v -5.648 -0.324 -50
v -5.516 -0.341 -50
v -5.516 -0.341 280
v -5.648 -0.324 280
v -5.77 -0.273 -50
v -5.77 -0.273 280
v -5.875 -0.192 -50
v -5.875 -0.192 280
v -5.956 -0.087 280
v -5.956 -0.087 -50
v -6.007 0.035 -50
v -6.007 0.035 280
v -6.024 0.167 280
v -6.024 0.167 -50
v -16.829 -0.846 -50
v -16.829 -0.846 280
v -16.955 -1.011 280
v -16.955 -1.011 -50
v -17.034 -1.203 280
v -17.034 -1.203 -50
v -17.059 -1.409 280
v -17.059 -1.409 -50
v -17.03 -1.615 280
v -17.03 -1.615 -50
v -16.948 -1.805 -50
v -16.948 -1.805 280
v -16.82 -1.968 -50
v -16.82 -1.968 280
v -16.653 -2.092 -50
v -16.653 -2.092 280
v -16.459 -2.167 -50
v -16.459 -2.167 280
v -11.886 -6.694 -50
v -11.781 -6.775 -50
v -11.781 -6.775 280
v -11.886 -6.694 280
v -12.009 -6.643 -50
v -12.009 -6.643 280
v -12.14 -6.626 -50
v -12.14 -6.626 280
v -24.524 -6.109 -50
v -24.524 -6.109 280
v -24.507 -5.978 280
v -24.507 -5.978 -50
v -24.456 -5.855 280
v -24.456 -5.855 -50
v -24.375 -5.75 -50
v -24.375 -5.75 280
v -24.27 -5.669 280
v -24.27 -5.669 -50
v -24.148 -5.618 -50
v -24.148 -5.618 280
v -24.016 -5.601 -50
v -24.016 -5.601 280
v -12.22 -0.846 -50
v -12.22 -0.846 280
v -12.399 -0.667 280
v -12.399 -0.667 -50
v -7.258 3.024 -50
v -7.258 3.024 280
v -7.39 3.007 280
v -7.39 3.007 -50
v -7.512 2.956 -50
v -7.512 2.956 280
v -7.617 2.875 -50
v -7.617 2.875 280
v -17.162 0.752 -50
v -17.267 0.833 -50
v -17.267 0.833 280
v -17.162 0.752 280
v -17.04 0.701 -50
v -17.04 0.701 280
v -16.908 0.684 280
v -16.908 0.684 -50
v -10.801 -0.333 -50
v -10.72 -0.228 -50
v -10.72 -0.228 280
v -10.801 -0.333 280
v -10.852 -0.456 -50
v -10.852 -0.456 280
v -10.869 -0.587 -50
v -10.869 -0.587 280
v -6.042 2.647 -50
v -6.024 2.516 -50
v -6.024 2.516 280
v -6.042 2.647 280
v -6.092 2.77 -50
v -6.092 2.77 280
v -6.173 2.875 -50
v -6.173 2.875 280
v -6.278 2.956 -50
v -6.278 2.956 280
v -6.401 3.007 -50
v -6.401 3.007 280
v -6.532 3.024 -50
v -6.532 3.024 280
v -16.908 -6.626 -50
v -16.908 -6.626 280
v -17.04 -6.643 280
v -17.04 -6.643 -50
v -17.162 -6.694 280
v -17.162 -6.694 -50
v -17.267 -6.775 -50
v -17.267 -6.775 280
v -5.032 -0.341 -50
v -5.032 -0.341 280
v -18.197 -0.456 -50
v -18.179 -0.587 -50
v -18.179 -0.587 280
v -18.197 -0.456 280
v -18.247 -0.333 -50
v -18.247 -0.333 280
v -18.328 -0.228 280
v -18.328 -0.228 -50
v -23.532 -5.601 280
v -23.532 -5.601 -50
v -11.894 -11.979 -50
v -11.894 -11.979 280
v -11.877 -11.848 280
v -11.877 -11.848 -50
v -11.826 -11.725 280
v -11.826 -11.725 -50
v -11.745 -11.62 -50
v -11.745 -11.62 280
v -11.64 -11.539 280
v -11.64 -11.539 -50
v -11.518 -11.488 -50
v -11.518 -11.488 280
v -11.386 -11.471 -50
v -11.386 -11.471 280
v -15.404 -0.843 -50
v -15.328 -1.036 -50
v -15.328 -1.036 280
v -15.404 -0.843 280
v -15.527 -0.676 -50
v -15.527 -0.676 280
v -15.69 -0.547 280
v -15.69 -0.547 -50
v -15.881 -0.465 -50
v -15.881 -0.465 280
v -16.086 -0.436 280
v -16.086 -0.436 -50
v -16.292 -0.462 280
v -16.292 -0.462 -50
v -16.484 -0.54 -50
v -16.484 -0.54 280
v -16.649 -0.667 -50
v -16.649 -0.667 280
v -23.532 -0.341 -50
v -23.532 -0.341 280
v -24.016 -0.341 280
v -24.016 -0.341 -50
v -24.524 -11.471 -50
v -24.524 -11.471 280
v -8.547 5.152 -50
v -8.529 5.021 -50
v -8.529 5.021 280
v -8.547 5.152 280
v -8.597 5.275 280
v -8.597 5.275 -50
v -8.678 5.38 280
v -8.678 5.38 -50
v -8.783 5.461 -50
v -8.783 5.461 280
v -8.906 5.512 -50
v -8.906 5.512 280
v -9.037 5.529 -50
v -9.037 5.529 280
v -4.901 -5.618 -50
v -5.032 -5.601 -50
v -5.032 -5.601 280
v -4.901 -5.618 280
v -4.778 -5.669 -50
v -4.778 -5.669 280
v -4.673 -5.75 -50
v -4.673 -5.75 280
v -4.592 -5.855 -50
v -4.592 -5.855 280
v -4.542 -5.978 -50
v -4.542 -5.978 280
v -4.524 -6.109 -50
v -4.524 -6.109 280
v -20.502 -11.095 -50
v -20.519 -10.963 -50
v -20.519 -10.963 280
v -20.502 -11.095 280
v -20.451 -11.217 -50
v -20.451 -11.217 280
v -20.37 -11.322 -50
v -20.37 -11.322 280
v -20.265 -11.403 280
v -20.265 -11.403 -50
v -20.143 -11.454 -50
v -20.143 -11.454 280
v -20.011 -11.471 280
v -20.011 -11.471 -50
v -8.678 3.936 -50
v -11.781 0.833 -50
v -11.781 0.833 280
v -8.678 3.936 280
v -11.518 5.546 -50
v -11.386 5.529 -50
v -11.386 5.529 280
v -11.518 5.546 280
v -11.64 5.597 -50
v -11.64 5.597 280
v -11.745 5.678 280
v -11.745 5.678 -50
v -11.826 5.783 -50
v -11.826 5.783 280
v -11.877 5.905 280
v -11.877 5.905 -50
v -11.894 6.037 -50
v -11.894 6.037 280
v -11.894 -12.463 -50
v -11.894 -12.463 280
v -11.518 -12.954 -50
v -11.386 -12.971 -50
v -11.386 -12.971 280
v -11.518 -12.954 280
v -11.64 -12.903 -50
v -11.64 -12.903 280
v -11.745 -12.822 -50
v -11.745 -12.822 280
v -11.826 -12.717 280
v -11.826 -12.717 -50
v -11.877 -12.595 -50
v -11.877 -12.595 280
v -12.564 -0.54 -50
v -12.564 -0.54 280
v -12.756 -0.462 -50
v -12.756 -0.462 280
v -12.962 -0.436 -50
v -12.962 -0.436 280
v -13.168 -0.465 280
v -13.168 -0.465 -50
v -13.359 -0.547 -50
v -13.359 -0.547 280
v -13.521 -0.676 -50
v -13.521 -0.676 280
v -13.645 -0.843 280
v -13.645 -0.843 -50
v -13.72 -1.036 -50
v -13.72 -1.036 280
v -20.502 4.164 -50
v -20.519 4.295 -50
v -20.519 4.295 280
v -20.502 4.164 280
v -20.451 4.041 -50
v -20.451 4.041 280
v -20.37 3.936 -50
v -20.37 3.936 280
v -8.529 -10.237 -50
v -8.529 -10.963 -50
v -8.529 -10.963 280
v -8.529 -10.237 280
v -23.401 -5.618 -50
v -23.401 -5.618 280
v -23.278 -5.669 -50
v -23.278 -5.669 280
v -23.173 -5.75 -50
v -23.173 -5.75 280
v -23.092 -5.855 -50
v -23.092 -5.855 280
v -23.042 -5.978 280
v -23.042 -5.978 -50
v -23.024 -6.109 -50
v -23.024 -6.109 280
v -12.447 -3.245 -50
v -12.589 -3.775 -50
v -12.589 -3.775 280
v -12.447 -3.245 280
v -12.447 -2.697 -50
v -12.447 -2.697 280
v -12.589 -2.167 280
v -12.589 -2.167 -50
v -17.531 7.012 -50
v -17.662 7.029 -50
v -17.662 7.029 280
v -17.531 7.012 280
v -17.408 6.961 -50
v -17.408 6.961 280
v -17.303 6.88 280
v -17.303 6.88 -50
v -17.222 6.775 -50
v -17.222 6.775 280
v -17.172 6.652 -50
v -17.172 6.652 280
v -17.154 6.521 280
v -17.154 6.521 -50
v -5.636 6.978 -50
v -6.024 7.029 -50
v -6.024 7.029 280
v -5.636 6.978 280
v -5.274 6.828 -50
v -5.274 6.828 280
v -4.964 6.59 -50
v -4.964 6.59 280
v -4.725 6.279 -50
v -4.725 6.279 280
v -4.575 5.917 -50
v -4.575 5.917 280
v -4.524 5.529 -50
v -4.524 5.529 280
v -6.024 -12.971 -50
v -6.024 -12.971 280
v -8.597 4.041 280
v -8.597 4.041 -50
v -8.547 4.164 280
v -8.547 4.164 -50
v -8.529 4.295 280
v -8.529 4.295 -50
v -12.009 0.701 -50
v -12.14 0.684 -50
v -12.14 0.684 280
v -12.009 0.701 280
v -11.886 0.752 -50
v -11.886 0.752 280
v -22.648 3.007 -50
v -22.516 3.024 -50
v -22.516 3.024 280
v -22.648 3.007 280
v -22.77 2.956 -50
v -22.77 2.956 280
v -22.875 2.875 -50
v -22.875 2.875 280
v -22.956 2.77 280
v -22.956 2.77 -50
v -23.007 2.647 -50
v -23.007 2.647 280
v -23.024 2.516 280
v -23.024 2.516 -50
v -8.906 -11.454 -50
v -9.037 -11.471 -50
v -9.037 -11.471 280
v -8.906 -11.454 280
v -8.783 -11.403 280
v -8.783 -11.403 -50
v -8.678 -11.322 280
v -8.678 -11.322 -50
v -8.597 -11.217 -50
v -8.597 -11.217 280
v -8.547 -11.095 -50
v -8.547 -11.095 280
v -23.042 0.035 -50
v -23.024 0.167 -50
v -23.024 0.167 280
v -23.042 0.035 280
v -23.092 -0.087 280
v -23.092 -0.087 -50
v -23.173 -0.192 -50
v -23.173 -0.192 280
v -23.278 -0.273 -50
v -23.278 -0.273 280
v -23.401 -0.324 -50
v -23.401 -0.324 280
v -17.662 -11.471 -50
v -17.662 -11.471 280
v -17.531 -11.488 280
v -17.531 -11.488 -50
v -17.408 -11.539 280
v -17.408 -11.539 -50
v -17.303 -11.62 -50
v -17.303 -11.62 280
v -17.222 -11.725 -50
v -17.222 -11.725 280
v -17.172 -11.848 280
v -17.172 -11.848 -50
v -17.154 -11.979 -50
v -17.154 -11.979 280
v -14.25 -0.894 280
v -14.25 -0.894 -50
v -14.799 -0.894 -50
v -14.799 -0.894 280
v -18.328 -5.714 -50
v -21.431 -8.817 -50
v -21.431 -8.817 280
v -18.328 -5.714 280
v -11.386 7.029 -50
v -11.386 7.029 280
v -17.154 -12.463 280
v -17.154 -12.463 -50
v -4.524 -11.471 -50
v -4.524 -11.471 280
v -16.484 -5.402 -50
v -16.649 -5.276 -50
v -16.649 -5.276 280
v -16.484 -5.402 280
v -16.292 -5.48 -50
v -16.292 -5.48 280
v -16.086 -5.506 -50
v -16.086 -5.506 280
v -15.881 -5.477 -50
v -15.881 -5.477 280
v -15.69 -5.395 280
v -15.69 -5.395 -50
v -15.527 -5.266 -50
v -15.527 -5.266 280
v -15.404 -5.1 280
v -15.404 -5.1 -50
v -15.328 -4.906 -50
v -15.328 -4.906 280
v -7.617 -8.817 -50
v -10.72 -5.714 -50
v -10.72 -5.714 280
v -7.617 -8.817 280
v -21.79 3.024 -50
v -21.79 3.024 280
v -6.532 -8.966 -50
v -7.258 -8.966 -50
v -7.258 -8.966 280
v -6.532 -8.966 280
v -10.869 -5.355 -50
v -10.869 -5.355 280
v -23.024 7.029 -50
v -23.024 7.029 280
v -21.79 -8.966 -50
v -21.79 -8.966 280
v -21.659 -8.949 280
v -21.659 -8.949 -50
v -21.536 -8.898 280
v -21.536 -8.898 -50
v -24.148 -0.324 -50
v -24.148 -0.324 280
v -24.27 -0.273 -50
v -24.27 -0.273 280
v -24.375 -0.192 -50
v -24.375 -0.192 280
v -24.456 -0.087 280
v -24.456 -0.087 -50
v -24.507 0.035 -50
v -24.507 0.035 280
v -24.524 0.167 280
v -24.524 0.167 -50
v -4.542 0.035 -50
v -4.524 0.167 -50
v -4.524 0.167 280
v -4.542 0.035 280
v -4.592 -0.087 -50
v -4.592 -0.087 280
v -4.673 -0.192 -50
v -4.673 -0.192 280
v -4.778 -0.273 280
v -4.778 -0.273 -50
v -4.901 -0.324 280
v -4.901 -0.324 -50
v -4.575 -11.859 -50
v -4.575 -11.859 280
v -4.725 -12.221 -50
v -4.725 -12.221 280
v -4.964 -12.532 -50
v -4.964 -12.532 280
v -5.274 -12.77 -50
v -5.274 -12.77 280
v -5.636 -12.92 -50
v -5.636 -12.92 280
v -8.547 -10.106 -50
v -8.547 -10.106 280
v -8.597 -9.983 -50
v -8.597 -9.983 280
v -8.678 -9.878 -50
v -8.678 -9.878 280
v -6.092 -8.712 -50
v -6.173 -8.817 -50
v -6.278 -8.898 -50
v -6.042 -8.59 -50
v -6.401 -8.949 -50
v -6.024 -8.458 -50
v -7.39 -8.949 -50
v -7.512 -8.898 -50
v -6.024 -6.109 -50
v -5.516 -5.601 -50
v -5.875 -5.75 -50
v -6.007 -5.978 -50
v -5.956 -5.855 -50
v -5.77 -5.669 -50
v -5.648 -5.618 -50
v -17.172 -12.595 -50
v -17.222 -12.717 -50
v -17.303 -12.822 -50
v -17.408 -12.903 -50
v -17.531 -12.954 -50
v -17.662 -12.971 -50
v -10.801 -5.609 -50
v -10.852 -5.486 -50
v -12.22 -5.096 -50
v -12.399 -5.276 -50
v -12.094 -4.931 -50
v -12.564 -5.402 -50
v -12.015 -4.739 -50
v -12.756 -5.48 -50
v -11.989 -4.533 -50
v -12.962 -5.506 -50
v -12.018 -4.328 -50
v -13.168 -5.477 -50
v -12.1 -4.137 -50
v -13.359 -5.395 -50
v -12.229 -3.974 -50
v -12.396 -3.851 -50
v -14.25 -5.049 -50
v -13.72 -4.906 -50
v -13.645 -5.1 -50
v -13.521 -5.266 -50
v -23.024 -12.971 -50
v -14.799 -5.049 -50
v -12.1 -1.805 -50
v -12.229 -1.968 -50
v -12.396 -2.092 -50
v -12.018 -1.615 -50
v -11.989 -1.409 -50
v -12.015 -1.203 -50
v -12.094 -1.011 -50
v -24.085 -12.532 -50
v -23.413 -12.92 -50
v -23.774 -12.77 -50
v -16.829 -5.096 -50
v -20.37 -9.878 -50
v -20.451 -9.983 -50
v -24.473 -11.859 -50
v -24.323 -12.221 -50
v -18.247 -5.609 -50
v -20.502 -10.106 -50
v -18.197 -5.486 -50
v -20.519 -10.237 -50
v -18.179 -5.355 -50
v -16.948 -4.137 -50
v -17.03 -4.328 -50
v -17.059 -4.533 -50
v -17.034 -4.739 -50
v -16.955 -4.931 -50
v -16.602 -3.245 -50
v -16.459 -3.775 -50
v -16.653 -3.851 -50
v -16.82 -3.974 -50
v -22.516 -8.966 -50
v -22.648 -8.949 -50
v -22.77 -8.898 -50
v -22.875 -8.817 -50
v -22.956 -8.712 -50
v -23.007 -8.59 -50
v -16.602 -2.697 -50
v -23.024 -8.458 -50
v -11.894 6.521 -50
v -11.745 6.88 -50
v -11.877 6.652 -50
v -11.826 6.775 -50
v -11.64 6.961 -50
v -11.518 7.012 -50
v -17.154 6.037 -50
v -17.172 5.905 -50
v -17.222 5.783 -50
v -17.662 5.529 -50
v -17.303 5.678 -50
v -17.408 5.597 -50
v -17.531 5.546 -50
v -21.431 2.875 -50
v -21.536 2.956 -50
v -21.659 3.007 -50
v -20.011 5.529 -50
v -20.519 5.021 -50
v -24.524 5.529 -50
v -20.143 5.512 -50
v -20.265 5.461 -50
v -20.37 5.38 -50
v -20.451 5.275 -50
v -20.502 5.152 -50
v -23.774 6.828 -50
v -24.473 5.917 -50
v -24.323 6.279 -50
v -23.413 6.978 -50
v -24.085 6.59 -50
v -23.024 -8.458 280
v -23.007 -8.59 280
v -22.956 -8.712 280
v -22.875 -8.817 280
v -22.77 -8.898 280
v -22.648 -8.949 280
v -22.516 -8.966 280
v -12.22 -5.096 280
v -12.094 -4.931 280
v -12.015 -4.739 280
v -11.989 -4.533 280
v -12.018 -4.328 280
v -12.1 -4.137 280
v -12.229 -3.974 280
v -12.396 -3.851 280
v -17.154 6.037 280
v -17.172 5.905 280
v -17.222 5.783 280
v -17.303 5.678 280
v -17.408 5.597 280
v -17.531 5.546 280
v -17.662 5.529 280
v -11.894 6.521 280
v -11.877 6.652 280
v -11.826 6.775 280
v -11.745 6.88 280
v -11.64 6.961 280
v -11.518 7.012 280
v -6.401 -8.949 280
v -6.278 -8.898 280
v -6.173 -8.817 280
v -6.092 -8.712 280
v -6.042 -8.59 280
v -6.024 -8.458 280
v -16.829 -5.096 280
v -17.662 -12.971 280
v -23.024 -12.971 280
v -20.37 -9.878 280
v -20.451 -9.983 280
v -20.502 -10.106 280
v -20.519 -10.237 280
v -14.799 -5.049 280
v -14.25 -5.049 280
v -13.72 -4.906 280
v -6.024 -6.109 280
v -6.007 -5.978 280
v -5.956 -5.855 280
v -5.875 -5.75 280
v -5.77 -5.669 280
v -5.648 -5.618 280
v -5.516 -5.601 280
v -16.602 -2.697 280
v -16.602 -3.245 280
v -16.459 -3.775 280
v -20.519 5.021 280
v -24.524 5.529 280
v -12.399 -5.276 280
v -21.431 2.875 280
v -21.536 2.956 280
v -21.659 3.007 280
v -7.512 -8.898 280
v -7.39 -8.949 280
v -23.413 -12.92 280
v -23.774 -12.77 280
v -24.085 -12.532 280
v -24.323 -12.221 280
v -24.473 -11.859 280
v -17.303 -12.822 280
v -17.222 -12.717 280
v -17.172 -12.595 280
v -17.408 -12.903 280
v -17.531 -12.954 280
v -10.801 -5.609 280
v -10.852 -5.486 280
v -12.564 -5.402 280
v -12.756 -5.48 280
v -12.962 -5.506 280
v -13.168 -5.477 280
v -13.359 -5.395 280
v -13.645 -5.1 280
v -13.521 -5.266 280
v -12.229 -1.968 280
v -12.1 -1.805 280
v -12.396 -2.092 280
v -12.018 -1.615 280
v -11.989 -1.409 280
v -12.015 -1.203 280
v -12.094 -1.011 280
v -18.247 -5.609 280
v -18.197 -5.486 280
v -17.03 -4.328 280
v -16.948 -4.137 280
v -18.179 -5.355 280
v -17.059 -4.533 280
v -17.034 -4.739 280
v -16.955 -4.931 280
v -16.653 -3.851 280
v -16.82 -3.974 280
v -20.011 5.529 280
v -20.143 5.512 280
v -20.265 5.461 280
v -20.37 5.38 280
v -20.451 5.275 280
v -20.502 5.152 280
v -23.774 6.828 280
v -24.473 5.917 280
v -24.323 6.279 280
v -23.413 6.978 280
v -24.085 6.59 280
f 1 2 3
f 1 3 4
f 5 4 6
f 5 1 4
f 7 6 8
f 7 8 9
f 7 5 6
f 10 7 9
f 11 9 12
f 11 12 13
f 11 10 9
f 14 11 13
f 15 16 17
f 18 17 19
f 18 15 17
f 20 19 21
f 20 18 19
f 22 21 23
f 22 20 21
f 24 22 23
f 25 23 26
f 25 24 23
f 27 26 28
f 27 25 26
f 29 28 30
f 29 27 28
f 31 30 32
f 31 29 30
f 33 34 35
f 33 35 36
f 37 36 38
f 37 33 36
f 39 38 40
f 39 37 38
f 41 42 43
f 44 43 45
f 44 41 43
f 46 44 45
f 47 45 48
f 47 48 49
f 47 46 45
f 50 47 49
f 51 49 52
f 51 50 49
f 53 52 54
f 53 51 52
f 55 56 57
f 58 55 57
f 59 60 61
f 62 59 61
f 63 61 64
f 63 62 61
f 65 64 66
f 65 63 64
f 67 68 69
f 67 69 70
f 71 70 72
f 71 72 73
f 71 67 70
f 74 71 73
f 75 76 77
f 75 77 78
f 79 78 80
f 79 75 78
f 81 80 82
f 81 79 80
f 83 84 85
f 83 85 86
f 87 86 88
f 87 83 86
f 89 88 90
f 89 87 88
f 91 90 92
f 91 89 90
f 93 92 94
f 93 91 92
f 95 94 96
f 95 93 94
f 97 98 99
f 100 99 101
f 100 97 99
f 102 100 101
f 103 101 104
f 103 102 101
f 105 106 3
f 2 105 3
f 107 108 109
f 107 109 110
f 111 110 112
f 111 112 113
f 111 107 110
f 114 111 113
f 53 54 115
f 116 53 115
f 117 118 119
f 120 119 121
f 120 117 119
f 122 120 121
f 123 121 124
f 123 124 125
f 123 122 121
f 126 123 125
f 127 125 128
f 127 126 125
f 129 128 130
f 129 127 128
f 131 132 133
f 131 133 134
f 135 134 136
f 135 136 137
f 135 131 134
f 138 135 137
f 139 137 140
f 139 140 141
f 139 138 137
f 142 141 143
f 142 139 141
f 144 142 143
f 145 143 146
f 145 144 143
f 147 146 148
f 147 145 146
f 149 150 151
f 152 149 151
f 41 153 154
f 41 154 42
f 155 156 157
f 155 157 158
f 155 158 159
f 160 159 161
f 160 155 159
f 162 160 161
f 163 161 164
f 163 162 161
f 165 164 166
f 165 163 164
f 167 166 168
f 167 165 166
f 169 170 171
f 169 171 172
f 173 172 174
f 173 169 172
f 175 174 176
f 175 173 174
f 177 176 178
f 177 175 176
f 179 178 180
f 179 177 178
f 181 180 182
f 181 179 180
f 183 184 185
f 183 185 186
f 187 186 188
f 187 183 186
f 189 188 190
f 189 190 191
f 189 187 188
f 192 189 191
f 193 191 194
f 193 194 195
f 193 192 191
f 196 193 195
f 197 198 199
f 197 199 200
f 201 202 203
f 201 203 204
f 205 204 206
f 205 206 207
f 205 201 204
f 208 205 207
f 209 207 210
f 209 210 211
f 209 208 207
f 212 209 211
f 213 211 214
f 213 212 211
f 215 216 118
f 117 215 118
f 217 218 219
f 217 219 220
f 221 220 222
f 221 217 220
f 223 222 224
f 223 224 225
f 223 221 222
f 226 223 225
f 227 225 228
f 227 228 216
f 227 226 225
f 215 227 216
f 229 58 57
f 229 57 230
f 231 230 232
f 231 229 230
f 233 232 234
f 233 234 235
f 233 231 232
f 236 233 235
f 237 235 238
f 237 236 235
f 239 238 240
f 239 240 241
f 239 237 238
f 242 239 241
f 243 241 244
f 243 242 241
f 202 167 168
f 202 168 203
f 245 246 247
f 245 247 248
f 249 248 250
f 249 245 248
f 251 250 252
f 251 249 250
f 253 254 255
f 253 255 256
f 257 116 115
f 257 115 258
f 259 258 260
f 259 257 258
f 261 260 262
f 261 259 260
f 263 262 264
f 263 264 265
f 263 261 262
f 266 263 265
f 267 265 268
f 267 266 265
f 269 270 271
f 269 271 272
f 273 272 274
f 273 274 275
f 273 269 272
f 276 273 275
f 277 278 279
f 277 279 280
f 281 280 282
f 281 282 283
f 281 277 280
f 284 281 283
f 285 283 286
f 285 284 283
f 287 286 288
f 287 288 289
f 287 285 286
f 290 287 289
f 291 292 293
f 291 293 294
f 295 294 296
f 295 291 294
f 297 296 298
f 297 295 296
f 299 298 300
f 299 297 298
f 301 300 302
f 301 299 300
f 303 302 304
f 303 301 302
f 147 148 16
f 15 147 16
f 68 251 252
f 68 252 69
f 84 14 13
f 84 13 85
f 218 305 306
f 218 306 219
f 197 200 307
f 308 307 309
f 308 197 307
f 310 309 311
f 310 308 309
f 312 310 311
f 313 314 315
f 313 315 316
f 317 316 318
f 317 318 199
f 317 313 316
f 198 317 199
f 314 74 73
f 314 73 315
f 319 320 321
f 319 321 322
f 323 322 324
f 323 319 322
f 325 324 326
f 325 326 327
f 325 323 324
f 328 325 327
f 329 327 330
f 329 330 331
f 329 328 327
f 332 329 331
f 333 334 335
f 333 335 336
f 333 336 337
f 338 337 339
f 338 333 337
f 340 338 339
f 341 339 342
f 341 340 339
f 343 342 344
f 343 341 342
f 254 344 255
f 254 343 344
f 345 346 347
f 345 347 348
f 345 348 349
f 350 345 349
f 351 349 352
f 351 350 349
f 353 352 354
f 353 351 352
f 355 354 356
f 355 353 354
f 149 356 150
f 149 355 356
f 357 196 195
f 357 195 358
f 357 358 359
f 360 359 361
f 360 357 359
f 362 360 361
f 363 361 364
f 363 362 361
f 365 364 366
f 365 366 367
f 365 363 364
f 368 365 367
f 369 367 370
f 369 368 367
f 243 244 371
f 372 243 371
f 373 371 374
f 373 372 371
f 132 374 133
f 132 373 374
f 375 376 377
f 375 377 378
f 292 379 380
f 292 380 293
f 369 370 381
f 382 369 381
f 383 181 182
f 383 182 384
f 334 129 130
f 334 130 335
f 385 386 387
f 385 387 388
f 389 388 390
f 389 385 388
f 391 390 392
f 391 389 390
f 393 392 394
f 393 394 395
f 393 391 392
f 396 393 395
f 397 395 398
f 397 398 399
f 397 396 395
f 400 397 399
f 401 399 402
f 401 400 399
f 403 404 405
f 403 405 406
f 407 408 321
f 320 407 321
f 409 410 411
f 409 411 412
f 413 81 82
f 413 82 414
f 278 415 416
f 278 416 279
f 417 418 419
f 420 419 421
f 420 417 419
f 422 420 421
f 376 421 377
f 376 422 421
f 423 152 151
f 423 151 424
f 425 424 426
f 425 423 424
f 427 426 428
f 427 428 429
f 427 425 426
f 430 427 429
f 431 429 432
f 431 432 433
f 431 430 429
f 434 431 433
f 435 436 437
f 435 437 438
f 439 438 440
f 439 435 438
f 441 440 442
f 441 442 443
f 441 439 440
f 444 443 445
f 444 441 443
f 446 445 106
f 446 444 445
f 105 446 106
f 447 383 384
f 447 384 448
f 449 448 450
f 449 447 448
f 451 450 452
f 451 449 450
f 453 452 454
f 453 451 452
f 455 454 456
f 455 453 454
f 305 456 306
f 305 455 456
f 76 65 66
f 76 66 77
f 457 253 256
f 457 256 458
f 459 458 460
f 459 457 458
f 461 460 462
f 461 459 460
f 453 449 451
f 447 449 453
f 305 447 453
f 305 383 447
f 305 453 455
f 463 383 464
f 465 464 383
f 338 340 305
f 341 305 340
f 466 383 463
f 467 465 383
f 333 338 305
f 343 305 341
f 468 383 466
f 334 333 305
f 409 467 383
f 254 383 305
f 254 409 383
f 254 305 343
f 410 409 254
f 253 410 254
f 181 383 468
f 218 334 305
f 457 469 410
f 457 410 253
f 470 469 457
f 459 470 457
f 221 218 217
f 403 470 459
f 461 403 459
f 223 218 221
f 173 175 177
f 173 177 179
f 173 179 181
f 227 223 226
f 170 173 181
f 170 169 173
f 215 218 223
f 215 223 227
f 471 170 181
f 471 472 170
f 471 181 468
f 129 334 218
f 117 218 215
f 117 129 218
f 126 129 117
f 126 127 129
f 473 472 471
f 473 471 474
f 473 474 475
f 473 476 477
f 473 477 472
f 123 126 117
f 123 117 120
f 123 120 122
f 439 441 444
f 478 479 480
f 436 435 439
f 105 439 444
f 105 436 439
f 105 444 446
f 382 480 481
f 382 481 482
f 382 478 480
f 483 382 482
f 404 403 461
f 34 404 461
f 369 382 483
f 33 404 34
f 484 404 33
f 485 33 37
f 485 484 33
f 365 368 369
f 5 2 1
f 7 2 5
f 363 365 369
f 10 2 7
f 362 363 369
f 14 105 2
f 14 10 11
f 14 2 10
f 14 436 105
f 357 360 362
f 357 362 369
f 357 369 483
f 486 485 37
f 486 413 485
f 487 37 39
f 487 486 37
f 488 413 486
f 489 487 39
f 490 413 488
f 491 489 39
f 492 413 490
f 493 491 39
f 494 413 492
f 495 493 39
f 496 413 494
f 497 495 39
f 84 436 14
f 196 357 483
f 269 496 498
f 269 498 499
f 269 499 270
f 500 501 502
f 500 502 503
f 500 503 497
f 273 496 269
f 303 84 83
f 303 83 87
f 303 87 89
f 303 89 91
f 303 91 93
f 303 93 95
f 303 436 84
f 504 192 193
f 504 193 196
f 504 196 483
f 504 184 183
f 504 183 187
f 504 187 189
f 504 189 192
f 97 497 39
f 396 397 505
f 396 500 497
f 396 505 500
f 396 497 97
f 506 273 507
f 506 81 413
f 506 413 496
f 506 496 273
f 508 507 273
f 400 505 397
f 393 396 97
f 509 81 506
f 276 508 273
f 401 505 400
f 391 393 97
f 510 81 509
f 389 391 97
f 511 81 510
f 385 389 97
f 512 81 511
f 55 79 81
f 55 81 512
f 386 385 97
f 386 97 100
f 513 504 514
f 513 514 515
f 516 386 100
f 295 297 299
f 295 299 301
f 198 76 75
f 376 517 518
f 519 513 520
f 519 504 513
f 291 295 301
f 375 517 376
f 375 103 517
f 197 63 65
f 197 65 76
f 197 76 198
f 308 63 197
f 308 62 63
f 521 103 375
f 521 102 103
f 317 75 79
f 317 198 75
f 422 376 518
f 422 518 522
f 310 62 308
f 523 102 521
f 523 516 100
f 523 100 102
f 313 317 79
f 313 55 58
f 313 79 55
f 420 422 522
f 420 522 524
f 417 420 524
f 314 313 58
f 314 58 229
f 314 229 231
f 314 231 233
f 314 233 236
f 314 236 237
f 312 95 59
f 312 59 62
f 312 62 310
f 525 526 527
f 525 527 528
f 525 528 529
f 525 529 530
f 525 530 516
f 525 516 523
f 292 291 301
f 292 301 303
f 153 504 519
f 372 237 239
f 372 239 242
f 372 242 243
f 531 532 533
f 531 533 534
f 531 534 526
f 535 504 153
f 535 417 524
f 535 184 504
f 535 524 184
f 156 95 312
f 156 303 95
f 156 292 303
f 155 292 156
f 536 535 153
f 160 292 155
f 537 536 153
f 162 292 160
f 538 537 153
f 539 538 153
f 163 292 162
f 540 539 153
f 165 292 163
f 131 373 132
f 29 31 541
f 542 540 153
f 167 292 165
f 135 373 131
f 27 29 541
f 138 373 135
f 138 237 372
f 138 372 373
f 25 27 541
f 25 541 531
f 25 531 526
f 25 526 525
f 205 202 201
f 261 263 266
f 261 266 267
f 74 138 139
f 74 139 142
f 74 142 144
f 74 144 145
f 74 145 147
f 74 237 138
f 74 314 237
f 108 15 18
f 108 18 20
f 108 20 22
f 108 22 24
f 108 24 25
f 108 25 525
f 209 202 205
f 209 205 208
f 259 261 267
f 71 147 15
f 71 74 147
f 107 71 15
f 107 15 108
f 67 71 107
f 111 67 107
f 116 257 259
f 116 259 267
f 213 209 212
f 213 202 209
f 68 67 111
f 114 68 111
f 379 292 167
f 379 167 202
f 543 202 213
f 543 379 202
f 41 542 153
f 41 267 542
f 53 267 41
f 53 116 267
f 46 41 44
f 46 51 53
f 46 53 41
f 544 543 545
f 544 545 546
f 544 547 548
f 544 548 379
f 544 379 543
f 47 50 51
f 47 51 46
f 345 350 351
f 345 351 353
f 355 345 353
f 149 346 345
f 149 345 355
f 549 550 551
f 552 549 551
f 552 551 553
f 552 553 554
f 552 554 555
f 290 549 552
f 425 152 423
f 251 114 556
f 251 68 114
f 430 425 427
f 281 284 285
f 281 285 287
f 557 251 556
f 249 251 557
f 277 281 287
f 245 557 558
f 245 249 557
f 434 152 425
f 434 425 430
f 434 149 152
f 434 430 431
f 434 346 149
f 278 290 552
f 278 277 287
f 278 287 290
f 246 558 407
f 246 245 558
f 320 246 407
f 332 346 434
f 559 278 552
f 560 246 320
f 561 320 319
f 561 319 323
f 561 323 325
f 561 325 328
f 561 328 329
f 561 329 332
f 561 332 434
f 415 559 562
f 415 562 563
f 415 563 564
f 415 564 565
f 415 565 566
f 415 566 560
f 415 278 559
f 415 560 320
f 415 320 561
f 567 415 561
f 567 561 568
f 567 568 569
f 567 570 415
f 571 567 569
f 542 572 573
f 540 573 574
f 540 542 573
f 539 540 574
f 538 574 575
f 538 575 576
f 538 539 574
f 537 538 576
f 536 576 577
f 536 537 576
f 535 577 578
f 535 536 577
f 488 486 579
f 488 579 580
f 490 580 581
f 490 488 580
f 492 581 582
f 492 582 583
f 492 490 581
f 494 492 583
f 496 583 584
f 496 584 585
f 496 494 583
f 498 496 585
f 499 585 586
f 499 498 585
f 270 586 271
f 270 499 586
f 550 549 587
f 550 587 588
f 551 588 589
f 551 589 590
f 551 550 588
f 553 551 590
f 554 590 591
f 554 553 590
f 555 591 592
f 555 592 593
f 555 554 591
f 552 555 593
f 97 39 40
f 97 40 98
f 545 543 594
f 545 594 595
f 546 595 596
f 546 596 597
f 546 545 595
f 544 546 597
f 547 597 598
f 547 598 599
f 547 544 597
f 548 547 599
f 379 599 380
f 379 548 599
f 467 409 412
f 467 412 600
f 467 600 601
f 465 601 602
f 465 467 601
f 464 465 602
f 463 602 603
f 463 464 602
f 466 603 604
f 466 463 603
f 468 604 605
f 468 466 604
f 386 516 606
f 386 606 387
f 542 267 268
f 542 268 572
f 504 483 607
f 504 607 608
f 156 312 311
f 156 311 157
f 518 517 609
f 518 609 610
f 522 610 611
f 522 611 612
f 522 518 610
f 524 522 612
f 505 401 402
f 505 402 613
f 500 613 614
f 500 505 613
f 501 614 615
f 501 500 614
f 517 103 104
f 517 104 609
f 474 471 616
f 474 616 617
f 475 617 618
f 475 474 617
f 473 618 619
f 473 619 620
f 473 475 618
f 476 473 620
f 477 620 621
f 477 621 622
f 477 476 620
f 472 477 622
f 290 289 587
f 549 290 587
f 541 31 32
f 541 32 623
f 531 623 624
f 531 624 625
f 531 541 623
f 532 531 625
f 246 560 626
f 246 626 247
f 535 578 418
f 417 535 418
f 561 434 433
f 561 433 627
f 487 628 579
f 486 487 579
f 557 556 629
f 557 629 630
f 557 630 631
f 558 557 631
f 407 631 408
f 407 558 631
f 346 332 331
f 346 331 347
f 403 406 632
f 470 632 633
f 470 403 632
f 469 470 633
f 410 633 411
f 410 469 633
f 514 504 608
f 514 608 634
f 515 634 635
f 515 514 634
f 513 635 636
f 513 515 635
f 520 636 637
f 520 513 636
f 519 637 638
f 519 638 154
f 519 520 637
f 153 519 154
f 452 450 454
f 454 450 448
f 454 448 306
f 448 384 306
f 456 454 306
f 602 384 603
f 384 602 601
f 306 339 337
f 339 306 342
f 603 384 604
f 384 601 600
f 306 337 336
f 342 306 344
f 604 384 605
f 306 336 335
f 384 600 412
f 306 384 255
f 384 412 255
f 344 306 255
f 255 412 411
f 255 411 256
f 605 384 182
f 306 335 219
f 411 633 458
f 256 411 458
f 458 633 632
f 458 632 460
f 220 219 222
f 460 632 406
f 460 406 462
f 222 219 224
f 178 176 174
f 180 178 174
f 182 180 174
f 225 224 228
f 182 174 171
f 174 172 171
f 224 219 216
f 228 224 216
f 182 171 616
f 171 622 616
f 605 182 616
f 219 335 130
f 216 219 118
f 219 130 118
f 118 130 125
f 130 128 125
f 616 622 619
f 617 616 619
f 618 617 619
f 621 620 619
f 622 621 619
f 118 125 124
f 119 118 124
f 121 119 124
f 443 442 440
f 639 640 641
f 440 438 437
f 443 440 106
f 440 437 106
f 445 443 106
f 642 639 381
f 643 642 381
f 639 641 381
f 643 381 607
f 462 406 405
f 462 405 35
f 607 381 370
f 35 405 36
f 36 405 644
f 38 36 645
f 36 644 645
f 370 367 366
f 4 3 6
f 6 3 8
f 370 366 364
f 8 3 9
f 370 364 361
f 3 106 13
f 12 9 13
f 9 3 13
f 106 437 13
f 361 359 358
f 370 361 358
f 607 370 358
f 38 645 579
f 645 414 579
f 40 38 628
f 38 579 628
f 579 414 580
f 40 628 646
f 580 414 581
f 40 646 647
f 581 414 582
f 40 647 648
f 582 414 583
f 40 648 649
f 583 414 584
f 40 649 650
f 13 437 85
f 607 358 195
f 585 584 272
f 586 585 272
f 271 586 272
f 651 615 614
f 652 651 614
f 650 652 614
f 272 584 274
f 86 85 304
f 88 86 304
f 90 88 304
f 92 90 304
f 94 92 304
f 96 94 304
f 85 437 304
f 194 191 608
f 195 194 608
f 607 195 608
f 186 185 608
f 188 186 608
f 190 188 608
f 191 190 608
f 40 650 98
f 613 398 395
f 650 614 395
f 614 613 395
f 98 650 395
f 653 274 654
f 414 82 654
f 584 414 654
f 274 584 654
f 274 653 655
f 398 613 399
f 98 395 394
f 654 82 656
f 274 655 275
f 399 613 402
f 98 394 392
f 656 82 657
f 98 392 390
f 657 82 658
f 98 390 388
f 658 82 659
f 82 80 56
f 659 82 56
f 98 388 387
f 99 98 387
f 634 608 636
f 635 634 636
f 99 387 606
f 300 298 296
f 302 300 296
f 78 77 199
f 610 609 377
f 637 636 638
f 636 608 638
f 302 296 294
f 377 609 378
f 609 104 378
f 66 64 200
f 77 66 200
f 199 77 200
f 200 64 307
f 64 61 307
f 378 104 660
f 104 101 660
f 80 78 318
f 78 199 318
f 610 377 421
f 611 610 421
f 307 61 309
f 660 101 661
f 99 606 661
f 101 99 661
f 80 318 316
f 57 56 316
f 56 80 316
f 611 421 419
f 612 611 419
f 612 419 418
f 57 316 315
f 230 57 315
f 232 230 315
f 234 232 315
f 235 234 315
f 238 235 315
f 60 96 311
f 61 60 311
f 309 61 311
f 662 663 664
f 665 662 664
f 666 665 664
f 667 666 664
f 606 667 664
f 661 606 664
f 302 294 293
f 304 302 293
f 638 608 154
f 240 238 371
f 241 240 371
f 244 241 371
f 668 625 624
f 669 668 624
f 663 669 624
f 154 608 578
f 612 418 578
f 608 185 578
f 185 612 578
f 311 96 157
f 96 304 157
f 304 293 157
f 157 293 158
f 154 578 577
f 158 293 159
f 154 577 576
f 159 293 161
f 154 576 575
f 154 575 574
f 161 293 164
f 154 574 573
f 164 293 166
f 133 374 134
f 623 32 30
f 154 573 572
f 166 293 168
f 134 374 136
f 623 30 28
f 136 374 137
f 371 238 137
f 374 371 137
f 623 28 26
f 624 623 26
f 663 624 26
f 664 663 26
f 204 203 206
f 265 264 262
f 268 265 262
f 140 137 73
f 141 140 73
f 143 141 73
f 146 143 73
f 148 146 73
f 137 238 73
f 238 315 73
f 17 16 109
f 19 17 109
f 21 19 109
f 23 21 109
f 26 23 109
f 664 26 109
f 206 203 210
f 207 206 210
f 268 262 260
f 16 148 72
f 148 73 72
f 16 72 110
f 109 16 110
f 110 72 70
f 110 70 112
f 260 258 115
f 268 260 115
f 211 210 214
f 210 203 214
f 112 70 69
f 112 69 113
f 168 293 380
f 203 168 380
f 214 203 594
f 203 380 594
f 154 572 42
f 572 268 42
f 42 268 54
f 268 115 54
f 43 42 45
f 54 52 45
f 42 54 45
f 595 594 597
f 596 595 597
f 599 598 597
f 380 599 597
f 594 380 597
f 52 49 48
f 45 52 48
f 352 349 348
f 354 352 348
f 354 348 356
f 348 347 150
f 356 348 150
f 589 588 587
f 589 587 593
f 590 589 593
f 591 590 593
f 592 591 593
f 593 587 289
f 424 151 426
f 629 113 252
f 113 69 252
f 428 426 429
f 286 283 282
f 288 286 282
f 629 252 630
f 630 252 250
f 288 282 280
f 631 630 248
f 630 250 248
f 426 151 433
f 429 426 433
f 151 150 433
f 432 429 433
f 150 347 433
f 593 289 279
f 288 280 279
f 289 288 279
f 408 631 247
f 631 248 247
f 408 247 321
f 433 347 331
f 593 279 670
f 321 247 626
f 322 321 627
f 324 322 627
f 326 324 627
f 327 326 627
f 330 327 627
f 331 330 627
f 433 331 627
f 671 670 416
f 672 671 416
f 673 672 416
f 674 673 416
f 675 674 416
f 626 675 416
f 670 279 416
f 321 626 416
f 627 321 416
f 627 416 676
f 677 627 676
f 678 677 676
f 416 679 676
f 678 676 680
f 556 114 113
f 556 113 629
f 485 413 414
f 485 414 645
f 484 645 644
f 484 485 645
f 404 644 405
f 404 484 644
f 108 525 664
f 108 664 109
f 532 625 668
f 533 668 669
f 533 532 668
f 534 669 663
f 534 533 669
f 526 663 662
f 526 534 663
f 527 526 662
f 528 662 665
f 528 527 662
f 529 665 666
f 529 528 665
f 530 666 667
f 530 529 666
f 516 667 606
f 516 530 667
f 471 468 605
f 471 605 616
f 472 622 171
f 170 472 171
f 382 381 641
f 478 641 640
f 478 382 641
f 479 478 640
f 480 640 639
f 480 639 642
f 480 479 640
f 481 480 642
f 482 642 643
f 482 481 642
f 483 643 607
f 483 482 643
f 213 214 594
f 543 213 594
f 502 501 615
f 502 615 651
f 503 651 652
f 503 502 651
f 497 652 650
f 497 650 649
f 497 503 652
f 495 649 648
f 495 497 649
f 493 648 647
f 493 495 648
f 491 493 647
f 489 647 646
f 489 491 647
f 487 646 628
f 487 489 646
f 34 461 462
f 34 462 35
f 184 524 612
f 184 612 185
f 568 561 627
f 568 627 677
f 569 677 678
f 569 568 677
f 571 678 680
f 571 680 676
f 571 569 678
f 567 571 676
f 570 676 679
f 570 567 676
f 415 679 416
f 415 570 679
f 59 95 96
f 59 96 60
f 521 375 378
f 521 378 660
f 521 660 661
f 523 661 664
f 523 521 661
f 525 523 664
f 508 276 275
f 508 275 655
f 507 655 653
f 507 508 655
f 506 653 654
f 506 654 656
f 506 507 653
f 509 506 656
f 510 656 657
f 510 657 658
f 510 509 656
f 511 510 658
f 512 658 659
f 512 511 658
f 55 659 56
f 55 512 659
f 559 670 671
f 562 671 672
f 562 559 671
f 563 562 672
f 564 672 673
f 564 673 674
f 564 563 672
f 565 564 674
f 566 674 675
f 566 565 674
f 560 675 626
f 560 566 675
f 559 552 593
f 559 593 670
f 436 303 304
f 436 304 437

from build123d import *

# Parameters (mm, degrees)
EXTRUDE1_DEPTH      = 280
EXTRUDE1_DEPTH_BACK = 50


with BuildPart() as part:
    # Sketch1 → Extrude1 (new, two sides: drawn at the far end of the back side and taken through both)
    with BuildSketch(Plane.XY.offset(-EXTRUDE1_DEPTH_BACK)):
        with BuildLine():
            Line((-5.032287798, -0.341059771), (-5.516287798, -0.341059771))
            ThreePointArc((-5.516287798, -0.341059771), (-5.875498042, -0.192270016), (-6.024287798, 0.166940229))
            Line((-6.024287798, 0.166940229), (-6.024287798, 2.515940229))
            ThreePointArc((-6.024287798, 2.515940229), (-6.173077553, 2.875150474), (-6.532287798, 3.023940229))
            Line((-6.532287798, 3.023940229), (-7.258207136, 3.023940229))
            ThreePointArc((-7.258207136, 3.023940229), (-7.45261032, 2.985271032), (-7.617417381, 2.875150474))
            Line((-7.617417381, 2.875150474), (-10.720498042, -0.227930187))
            ThreePointArc((-10.720498042, -0.227930187), (-10.8306186, -0.392737249), (-10.869287798, -0.587140432))
            Line((-10.869287798, -0.587140432), (-10.869287798, -5.354979109))
            ThreePointArc((-10.869287798, -5.354979109), (-10.8306186, -5.549382293), (-10.720498042, -5.714189354))
            Line((-10.720498042, -5.714189354), (-7.617417381, -8.817270016))
            ThreePointArc((-7.617417381, -8.817270016), (-7.45261032, -8.927390573), (-7.258207136, -8.966059771))
            Line((-7.258207136, -8.966059771), (-6.532287798, -8.966059771))
            ThreePointArc((-6.532287798, -8.966059771), (-6.173077553, -8.817270016), (-6.024287798, -8.458059771))
            Line((-6.024287798, -8.458059771), (-6.024287798, -6.109059771))
            ThreePointArc((-6.024287798, -6.109059771), (-5.875498042, -5.749849526), (-5.516287798, -5.601059771))
            Line((-5.516287798, -5.601059771), (-5.032287798, -5.601059771))
            ThreePointArc((-5.032287798, -5.601059771), (-4.673077553, -5.749849526), (-4.524287798, -6.109059771))
            Line((-4.524287798, -6.109059771), (-4.524287798, -11.471059771))
            ThreePointArc((-4.524287798, -11.471059771), (-4.963627626, -12.531719943), (-6.024287798, -12.971059771))
            Line((-6.024287798, -12.971059771), (-11.386287798, -12.971059771))
            ThreePointArc((-11.386287798, -12.971059771), (-11.745498042, -12.822270016), (-11.894287798, -12.463059771))
            Line((-11.894287798, -12.463059771), (-11.894287798, -11.979059771))
            ThreePointArc((-11.894287798, -11.979059771), (-11.745498042, -11.619849526), (-11.386287798, -11.471059771))
            Line((-11.386287798, -11.471059771), (-9.037287798, -11.471059771))
            ThreePointArc((-9.037287798, -11.471059771), (-8.678077553, -11.322270016), (-8.529287798, -10.963059771))
            Line((-8.529287798, -10.963059771), (-8.529287798, -10.237140432))
            ThreePointArc((-8.529287798, -10.237140432), (-8.567956995, -10.042737249), (-8.678077553, -9.877930187))
            Line((-8.678077553, -9.877930187), (-11.781158214, -6.774849526))
            ThreePointArc((-11.781158214, -6.774849526), (-11.945965275, -6.664728968), (-12.140368459, -6.626059771))
            Line((-12.140368459, -6.626059771), (-16.908207136, -6.626059771))
            ThreePointArc((-16.908207136, -6.626059771), (-17.10261032, -6.664728968), (-17.267417381, -6.774849526))
            Line((-17.267417381, -6.774849526), (-20.370498042, -9.877930187))
            ThreePointArc((-20.370498042, -9.877930187), (-20.4806186, -10.042737249), (-20.519287798, -10.237140432))
            Line((-20.519287798, -10.237140432), (-20.519287798, -10.963059771))
            ThreePointArc((-20.519287798, -10.963059771), (-20.370498042, -11.322270016), (-20.011287798, -11.471059771))
            Line((-20.011287798, -11.471059771), (-17.662287798, -11.471059771))
            ThreePointArc((-17.662287798, -11.471059771), (-17.303077553, -11.619849526), (-17.154287798, -11.979059771))
            Line((-17.154287798, -11.979059771), (-17.154287798, -12.463059771))
            ThreePointArc((-17.154287798, -12.463059771), (-17.303077553, -12.822270016), (-17.662287798, -12.971059771))
            Line((-17.662287798, -12.971059771), (-23.024287798, -12.971059771))
            ThreePointArc((-23.024287798, -12.971059771), (-24.084947969, -12.531719943), (-24.524287798, -11.471059771))
            Line((-24.524287798, -11.471059771), (-24.524287798, -6.109059771))
            ThreePointArc((-24.524287798, -6.109059771), (-24.375498042, -5.749849526), (-24.016287798, -5.601059771))
            Line((-24.016287798, -5.601059771), (-23.532287798, -5.601059771))
            ThreePointArc((-23.532287798, -5.601059771), (-23.173077553, -5.749849526), (-23.024287798, -6.109059771))
            Line((-23.024287798, -6.109059771), (-23.024287798, -8.458059771))
            ThreePointArc((-23.024287798, -8.458059771), (-22.875498042, -8.817270016), (-22.516287798, -8.966059771))
            Line((-22.516287798, -8.966059771), (-21.790368459, -8.966059771))
            ThreePointArc((-21.790368459, -8.966059771), (-21.595965275, -8.927390573), (-21.431158214, -8.817270016))
            Line((-21.431158214, -8.817270016), (-18.328077553, -5.714189354))
            ThreePointArc((-18.328077553, -5.714189354), (-18.217956995, -5.549382293), (-18.179287798, -5.354979109))
            Line((-18.179287798, -5.354979109), (-18.179287798, -0.587140432))
            ThreePointArc((-18.179287798, -0.587140432), (-18.217956995, -0.392737249), (-18.328077553, -0.227930187))
            Line((-18.328077553, -0.227930187), (-21.431158214, 2.875150474))
            ThreePointArc((-21.431158214, 2.875150474), (-21.595965275, 2.985271032), (-21.790368459, 3.023940229))
            Line((-21.790368459, 3.023940229), (-22.516287798, 3.023940229))
            ThreePointArc((-22.516287798, 3.023940229), (-22.875498042, 2.875150474), (-23.024287798, 2.515940229))
            Line((-23.024287798, 2.515940229), (-23.024287798, 0.166940229))
            ThreePointArc((-23.024287798, 0.166940229), (-23.173077553, -0.192270016), (-23.532287798, -0.341059771))
            Line((-23.532287798, -0.341059771), (-24.016287798, -0.341059771))
            ThreePointArc((-24.016287798, -0.341059771), (-24.375498042, -0.192270016), (-24.524287798, 0.166940229))
            Line((-24.524287798, 0.166940229), (-24.524287798, 5.528940229))
            ThreePointArc((-24.524287798, 5.528940229), (-24.084947969, 6.589600401), (-23.024287798, 7.028940229))
            Line((-23.024287798, 7.028940229), (-17.662287798, 7.028940229))
            ThreePointArc((-17.662287798, 7.028940229), (-17.303077553, 6.880150474), (-17.154287798, 6.520940229))
            Line((-17.154287798, 6.520940229), (-17.154287798, 6.036940229))
            ThreePointArc((-17.154287798, 6.036940229), (-17.303077553, 5.677729984), (-17.662287798, 5.528940229))
            Line((-17.662287798, 5.528940229), (-20.011287798, 5.528940229))
            ThreePointArc((-20.011287798, 5.528940229), (-20.370498042, 5.380150474), (-20.519287798, 5.020940229))
            Line((-20.519287798, 5.020940229), (-20.519287798, 4.295020891))
            ThreePointArc((-20.519287798, 4.295020891), (-20.4806186, 4.100617707), (-20.370498042, 3.935810646))
            Line((-20.370498042, 3.935810646), (-17.267417381, 0.832729984))
            ThreePointArc((-17.267417381, 0.832729984), (-17.10261032, 0.722609427), (-16.908207136, 0.683940229))
            Line((-16.908207136, 0.683940229), (-12.140368459, 0.683940229))
            ThreePointArc((-12.140368459, 0.683940229), (-11.945965275, 0.722609427), (-11.781158214, 0.832729984))
            Line((-11.781158214, 0.832729984), (-8.678077553, 3.935810646))
            ThreePointArc((-8.678077553, 3.935810646), (-8.567956995, 4.100617707), (-8.529287798, 4.295020891))
            Line((-8.529287798, 4.295020891), (-8.529287798, 5.020940229))
            ThreePointArc((-8.529287798, 5.020940229), (-8.678077553, 5.380150474), (-9.037287798, 5.528940229))
            Line((-9.037287798, 5.528940229), (-11.386287798, 5.528940229))
            ThreePointArc((-11.386287798, 5.528940229), (-11.745498042, 5.677729984), (-11.894287798, 6.036940229))
            Line((-11.894287798, 6.036940229), (-11.894287798, 6.520940229))
            ThreePointArc((-11.894287798, 6.520940229), (-11.745498042, 6.880150474), (-11.386287798, 7.028940229))
            Line((-11.386287798, 7.028940229), (-6.024287798, 7.028940229))
            ThreePointArc((-6.024287798, 7.028940229), (-4.963627626, 6.589600401), (-4.524287798, 5.528940229))
            Line((-4.524287798, 5.528940229), (-4.524287798, 0.166940229))
            ThreePointArc((-4.524287798, 0.166940229), (-4.673077553, -0.192270016), (-5.032287798, -0.341059771))
        make_face()
        with BuildLine():
            Line((-12.399386954, -5.275565737), (-12.219781831, -5.095960615))
            ThreePointArc((-12.219781831, -5.095960615), (-12.018349781, -4.327527582), (-12.589154291, -3.775036489))
            ThreePointArc((-12.589154291, -3.775036489), (-12.428787798, -2.971059771), (-12.589154291, -2.167083053))
            ThreePointArc((-12.589154291, -2.167083053), (-12.018349781, -1.61459196), (-12.219781831, -0.846158927))
            Line((-12.219781831, -0.846158927), (-12.399386954, -0.666553805))
            ThreePointArc((-12.399386954, -0.666553805), (-13.167819987, -0.465121754), (-13.72031108, -1.035926265))
            ThreePointArc((-13.72031108, -1.035926265), (-14.524287798, -0.875559771), (-15.328264516, -1.035926265))
            ThreePointArc((-15.328264516, -1.035926265), (-15.880755608, -0.465121754), (-16.649188641, -0.666553805))
            Line((-16.649188641, -0.666553805), (-16.828793764, -0.846158927))
            ThreePointArc((-16.828793764, -0.846158927), (-17.030225814, -1.61459196), (-16.459421304, -2.167083053))
            ThreePointArc((-16.459421304, -2.167083053), (-16.619787798, -2.971059771), (-16.459421304, -3.775036489))
            ThreePointArc((-16.459421304, -3.775036489), (-17.030225814, -4.327527582), (-16.828793764, -5.095960615))
            Line((-16.828793764, -5.095960615), (-16.649188641, -5.275565737))
            ThreePointArc((-16.649188641, -5.275565737), (-15.880755608, -5.476997788), (-15.328264516, -4.906193277))
            ThreePointArc((-15.328264516, -4.906193277), (-14.524287798, -5.066559771), (-13.72031108, -4.906193277))
            ThreePointArc((-13.72031108, -4.906193277), (-13.167819987, -5.476997788), (-12.399386954, -5.275565737))
        make_face(mode=Mode.SUBTRACT)
    extrude(amount=EXTRUDE1_DEPTH + EXTRUDE1_DEPTH_BACK)


solid = part.part
